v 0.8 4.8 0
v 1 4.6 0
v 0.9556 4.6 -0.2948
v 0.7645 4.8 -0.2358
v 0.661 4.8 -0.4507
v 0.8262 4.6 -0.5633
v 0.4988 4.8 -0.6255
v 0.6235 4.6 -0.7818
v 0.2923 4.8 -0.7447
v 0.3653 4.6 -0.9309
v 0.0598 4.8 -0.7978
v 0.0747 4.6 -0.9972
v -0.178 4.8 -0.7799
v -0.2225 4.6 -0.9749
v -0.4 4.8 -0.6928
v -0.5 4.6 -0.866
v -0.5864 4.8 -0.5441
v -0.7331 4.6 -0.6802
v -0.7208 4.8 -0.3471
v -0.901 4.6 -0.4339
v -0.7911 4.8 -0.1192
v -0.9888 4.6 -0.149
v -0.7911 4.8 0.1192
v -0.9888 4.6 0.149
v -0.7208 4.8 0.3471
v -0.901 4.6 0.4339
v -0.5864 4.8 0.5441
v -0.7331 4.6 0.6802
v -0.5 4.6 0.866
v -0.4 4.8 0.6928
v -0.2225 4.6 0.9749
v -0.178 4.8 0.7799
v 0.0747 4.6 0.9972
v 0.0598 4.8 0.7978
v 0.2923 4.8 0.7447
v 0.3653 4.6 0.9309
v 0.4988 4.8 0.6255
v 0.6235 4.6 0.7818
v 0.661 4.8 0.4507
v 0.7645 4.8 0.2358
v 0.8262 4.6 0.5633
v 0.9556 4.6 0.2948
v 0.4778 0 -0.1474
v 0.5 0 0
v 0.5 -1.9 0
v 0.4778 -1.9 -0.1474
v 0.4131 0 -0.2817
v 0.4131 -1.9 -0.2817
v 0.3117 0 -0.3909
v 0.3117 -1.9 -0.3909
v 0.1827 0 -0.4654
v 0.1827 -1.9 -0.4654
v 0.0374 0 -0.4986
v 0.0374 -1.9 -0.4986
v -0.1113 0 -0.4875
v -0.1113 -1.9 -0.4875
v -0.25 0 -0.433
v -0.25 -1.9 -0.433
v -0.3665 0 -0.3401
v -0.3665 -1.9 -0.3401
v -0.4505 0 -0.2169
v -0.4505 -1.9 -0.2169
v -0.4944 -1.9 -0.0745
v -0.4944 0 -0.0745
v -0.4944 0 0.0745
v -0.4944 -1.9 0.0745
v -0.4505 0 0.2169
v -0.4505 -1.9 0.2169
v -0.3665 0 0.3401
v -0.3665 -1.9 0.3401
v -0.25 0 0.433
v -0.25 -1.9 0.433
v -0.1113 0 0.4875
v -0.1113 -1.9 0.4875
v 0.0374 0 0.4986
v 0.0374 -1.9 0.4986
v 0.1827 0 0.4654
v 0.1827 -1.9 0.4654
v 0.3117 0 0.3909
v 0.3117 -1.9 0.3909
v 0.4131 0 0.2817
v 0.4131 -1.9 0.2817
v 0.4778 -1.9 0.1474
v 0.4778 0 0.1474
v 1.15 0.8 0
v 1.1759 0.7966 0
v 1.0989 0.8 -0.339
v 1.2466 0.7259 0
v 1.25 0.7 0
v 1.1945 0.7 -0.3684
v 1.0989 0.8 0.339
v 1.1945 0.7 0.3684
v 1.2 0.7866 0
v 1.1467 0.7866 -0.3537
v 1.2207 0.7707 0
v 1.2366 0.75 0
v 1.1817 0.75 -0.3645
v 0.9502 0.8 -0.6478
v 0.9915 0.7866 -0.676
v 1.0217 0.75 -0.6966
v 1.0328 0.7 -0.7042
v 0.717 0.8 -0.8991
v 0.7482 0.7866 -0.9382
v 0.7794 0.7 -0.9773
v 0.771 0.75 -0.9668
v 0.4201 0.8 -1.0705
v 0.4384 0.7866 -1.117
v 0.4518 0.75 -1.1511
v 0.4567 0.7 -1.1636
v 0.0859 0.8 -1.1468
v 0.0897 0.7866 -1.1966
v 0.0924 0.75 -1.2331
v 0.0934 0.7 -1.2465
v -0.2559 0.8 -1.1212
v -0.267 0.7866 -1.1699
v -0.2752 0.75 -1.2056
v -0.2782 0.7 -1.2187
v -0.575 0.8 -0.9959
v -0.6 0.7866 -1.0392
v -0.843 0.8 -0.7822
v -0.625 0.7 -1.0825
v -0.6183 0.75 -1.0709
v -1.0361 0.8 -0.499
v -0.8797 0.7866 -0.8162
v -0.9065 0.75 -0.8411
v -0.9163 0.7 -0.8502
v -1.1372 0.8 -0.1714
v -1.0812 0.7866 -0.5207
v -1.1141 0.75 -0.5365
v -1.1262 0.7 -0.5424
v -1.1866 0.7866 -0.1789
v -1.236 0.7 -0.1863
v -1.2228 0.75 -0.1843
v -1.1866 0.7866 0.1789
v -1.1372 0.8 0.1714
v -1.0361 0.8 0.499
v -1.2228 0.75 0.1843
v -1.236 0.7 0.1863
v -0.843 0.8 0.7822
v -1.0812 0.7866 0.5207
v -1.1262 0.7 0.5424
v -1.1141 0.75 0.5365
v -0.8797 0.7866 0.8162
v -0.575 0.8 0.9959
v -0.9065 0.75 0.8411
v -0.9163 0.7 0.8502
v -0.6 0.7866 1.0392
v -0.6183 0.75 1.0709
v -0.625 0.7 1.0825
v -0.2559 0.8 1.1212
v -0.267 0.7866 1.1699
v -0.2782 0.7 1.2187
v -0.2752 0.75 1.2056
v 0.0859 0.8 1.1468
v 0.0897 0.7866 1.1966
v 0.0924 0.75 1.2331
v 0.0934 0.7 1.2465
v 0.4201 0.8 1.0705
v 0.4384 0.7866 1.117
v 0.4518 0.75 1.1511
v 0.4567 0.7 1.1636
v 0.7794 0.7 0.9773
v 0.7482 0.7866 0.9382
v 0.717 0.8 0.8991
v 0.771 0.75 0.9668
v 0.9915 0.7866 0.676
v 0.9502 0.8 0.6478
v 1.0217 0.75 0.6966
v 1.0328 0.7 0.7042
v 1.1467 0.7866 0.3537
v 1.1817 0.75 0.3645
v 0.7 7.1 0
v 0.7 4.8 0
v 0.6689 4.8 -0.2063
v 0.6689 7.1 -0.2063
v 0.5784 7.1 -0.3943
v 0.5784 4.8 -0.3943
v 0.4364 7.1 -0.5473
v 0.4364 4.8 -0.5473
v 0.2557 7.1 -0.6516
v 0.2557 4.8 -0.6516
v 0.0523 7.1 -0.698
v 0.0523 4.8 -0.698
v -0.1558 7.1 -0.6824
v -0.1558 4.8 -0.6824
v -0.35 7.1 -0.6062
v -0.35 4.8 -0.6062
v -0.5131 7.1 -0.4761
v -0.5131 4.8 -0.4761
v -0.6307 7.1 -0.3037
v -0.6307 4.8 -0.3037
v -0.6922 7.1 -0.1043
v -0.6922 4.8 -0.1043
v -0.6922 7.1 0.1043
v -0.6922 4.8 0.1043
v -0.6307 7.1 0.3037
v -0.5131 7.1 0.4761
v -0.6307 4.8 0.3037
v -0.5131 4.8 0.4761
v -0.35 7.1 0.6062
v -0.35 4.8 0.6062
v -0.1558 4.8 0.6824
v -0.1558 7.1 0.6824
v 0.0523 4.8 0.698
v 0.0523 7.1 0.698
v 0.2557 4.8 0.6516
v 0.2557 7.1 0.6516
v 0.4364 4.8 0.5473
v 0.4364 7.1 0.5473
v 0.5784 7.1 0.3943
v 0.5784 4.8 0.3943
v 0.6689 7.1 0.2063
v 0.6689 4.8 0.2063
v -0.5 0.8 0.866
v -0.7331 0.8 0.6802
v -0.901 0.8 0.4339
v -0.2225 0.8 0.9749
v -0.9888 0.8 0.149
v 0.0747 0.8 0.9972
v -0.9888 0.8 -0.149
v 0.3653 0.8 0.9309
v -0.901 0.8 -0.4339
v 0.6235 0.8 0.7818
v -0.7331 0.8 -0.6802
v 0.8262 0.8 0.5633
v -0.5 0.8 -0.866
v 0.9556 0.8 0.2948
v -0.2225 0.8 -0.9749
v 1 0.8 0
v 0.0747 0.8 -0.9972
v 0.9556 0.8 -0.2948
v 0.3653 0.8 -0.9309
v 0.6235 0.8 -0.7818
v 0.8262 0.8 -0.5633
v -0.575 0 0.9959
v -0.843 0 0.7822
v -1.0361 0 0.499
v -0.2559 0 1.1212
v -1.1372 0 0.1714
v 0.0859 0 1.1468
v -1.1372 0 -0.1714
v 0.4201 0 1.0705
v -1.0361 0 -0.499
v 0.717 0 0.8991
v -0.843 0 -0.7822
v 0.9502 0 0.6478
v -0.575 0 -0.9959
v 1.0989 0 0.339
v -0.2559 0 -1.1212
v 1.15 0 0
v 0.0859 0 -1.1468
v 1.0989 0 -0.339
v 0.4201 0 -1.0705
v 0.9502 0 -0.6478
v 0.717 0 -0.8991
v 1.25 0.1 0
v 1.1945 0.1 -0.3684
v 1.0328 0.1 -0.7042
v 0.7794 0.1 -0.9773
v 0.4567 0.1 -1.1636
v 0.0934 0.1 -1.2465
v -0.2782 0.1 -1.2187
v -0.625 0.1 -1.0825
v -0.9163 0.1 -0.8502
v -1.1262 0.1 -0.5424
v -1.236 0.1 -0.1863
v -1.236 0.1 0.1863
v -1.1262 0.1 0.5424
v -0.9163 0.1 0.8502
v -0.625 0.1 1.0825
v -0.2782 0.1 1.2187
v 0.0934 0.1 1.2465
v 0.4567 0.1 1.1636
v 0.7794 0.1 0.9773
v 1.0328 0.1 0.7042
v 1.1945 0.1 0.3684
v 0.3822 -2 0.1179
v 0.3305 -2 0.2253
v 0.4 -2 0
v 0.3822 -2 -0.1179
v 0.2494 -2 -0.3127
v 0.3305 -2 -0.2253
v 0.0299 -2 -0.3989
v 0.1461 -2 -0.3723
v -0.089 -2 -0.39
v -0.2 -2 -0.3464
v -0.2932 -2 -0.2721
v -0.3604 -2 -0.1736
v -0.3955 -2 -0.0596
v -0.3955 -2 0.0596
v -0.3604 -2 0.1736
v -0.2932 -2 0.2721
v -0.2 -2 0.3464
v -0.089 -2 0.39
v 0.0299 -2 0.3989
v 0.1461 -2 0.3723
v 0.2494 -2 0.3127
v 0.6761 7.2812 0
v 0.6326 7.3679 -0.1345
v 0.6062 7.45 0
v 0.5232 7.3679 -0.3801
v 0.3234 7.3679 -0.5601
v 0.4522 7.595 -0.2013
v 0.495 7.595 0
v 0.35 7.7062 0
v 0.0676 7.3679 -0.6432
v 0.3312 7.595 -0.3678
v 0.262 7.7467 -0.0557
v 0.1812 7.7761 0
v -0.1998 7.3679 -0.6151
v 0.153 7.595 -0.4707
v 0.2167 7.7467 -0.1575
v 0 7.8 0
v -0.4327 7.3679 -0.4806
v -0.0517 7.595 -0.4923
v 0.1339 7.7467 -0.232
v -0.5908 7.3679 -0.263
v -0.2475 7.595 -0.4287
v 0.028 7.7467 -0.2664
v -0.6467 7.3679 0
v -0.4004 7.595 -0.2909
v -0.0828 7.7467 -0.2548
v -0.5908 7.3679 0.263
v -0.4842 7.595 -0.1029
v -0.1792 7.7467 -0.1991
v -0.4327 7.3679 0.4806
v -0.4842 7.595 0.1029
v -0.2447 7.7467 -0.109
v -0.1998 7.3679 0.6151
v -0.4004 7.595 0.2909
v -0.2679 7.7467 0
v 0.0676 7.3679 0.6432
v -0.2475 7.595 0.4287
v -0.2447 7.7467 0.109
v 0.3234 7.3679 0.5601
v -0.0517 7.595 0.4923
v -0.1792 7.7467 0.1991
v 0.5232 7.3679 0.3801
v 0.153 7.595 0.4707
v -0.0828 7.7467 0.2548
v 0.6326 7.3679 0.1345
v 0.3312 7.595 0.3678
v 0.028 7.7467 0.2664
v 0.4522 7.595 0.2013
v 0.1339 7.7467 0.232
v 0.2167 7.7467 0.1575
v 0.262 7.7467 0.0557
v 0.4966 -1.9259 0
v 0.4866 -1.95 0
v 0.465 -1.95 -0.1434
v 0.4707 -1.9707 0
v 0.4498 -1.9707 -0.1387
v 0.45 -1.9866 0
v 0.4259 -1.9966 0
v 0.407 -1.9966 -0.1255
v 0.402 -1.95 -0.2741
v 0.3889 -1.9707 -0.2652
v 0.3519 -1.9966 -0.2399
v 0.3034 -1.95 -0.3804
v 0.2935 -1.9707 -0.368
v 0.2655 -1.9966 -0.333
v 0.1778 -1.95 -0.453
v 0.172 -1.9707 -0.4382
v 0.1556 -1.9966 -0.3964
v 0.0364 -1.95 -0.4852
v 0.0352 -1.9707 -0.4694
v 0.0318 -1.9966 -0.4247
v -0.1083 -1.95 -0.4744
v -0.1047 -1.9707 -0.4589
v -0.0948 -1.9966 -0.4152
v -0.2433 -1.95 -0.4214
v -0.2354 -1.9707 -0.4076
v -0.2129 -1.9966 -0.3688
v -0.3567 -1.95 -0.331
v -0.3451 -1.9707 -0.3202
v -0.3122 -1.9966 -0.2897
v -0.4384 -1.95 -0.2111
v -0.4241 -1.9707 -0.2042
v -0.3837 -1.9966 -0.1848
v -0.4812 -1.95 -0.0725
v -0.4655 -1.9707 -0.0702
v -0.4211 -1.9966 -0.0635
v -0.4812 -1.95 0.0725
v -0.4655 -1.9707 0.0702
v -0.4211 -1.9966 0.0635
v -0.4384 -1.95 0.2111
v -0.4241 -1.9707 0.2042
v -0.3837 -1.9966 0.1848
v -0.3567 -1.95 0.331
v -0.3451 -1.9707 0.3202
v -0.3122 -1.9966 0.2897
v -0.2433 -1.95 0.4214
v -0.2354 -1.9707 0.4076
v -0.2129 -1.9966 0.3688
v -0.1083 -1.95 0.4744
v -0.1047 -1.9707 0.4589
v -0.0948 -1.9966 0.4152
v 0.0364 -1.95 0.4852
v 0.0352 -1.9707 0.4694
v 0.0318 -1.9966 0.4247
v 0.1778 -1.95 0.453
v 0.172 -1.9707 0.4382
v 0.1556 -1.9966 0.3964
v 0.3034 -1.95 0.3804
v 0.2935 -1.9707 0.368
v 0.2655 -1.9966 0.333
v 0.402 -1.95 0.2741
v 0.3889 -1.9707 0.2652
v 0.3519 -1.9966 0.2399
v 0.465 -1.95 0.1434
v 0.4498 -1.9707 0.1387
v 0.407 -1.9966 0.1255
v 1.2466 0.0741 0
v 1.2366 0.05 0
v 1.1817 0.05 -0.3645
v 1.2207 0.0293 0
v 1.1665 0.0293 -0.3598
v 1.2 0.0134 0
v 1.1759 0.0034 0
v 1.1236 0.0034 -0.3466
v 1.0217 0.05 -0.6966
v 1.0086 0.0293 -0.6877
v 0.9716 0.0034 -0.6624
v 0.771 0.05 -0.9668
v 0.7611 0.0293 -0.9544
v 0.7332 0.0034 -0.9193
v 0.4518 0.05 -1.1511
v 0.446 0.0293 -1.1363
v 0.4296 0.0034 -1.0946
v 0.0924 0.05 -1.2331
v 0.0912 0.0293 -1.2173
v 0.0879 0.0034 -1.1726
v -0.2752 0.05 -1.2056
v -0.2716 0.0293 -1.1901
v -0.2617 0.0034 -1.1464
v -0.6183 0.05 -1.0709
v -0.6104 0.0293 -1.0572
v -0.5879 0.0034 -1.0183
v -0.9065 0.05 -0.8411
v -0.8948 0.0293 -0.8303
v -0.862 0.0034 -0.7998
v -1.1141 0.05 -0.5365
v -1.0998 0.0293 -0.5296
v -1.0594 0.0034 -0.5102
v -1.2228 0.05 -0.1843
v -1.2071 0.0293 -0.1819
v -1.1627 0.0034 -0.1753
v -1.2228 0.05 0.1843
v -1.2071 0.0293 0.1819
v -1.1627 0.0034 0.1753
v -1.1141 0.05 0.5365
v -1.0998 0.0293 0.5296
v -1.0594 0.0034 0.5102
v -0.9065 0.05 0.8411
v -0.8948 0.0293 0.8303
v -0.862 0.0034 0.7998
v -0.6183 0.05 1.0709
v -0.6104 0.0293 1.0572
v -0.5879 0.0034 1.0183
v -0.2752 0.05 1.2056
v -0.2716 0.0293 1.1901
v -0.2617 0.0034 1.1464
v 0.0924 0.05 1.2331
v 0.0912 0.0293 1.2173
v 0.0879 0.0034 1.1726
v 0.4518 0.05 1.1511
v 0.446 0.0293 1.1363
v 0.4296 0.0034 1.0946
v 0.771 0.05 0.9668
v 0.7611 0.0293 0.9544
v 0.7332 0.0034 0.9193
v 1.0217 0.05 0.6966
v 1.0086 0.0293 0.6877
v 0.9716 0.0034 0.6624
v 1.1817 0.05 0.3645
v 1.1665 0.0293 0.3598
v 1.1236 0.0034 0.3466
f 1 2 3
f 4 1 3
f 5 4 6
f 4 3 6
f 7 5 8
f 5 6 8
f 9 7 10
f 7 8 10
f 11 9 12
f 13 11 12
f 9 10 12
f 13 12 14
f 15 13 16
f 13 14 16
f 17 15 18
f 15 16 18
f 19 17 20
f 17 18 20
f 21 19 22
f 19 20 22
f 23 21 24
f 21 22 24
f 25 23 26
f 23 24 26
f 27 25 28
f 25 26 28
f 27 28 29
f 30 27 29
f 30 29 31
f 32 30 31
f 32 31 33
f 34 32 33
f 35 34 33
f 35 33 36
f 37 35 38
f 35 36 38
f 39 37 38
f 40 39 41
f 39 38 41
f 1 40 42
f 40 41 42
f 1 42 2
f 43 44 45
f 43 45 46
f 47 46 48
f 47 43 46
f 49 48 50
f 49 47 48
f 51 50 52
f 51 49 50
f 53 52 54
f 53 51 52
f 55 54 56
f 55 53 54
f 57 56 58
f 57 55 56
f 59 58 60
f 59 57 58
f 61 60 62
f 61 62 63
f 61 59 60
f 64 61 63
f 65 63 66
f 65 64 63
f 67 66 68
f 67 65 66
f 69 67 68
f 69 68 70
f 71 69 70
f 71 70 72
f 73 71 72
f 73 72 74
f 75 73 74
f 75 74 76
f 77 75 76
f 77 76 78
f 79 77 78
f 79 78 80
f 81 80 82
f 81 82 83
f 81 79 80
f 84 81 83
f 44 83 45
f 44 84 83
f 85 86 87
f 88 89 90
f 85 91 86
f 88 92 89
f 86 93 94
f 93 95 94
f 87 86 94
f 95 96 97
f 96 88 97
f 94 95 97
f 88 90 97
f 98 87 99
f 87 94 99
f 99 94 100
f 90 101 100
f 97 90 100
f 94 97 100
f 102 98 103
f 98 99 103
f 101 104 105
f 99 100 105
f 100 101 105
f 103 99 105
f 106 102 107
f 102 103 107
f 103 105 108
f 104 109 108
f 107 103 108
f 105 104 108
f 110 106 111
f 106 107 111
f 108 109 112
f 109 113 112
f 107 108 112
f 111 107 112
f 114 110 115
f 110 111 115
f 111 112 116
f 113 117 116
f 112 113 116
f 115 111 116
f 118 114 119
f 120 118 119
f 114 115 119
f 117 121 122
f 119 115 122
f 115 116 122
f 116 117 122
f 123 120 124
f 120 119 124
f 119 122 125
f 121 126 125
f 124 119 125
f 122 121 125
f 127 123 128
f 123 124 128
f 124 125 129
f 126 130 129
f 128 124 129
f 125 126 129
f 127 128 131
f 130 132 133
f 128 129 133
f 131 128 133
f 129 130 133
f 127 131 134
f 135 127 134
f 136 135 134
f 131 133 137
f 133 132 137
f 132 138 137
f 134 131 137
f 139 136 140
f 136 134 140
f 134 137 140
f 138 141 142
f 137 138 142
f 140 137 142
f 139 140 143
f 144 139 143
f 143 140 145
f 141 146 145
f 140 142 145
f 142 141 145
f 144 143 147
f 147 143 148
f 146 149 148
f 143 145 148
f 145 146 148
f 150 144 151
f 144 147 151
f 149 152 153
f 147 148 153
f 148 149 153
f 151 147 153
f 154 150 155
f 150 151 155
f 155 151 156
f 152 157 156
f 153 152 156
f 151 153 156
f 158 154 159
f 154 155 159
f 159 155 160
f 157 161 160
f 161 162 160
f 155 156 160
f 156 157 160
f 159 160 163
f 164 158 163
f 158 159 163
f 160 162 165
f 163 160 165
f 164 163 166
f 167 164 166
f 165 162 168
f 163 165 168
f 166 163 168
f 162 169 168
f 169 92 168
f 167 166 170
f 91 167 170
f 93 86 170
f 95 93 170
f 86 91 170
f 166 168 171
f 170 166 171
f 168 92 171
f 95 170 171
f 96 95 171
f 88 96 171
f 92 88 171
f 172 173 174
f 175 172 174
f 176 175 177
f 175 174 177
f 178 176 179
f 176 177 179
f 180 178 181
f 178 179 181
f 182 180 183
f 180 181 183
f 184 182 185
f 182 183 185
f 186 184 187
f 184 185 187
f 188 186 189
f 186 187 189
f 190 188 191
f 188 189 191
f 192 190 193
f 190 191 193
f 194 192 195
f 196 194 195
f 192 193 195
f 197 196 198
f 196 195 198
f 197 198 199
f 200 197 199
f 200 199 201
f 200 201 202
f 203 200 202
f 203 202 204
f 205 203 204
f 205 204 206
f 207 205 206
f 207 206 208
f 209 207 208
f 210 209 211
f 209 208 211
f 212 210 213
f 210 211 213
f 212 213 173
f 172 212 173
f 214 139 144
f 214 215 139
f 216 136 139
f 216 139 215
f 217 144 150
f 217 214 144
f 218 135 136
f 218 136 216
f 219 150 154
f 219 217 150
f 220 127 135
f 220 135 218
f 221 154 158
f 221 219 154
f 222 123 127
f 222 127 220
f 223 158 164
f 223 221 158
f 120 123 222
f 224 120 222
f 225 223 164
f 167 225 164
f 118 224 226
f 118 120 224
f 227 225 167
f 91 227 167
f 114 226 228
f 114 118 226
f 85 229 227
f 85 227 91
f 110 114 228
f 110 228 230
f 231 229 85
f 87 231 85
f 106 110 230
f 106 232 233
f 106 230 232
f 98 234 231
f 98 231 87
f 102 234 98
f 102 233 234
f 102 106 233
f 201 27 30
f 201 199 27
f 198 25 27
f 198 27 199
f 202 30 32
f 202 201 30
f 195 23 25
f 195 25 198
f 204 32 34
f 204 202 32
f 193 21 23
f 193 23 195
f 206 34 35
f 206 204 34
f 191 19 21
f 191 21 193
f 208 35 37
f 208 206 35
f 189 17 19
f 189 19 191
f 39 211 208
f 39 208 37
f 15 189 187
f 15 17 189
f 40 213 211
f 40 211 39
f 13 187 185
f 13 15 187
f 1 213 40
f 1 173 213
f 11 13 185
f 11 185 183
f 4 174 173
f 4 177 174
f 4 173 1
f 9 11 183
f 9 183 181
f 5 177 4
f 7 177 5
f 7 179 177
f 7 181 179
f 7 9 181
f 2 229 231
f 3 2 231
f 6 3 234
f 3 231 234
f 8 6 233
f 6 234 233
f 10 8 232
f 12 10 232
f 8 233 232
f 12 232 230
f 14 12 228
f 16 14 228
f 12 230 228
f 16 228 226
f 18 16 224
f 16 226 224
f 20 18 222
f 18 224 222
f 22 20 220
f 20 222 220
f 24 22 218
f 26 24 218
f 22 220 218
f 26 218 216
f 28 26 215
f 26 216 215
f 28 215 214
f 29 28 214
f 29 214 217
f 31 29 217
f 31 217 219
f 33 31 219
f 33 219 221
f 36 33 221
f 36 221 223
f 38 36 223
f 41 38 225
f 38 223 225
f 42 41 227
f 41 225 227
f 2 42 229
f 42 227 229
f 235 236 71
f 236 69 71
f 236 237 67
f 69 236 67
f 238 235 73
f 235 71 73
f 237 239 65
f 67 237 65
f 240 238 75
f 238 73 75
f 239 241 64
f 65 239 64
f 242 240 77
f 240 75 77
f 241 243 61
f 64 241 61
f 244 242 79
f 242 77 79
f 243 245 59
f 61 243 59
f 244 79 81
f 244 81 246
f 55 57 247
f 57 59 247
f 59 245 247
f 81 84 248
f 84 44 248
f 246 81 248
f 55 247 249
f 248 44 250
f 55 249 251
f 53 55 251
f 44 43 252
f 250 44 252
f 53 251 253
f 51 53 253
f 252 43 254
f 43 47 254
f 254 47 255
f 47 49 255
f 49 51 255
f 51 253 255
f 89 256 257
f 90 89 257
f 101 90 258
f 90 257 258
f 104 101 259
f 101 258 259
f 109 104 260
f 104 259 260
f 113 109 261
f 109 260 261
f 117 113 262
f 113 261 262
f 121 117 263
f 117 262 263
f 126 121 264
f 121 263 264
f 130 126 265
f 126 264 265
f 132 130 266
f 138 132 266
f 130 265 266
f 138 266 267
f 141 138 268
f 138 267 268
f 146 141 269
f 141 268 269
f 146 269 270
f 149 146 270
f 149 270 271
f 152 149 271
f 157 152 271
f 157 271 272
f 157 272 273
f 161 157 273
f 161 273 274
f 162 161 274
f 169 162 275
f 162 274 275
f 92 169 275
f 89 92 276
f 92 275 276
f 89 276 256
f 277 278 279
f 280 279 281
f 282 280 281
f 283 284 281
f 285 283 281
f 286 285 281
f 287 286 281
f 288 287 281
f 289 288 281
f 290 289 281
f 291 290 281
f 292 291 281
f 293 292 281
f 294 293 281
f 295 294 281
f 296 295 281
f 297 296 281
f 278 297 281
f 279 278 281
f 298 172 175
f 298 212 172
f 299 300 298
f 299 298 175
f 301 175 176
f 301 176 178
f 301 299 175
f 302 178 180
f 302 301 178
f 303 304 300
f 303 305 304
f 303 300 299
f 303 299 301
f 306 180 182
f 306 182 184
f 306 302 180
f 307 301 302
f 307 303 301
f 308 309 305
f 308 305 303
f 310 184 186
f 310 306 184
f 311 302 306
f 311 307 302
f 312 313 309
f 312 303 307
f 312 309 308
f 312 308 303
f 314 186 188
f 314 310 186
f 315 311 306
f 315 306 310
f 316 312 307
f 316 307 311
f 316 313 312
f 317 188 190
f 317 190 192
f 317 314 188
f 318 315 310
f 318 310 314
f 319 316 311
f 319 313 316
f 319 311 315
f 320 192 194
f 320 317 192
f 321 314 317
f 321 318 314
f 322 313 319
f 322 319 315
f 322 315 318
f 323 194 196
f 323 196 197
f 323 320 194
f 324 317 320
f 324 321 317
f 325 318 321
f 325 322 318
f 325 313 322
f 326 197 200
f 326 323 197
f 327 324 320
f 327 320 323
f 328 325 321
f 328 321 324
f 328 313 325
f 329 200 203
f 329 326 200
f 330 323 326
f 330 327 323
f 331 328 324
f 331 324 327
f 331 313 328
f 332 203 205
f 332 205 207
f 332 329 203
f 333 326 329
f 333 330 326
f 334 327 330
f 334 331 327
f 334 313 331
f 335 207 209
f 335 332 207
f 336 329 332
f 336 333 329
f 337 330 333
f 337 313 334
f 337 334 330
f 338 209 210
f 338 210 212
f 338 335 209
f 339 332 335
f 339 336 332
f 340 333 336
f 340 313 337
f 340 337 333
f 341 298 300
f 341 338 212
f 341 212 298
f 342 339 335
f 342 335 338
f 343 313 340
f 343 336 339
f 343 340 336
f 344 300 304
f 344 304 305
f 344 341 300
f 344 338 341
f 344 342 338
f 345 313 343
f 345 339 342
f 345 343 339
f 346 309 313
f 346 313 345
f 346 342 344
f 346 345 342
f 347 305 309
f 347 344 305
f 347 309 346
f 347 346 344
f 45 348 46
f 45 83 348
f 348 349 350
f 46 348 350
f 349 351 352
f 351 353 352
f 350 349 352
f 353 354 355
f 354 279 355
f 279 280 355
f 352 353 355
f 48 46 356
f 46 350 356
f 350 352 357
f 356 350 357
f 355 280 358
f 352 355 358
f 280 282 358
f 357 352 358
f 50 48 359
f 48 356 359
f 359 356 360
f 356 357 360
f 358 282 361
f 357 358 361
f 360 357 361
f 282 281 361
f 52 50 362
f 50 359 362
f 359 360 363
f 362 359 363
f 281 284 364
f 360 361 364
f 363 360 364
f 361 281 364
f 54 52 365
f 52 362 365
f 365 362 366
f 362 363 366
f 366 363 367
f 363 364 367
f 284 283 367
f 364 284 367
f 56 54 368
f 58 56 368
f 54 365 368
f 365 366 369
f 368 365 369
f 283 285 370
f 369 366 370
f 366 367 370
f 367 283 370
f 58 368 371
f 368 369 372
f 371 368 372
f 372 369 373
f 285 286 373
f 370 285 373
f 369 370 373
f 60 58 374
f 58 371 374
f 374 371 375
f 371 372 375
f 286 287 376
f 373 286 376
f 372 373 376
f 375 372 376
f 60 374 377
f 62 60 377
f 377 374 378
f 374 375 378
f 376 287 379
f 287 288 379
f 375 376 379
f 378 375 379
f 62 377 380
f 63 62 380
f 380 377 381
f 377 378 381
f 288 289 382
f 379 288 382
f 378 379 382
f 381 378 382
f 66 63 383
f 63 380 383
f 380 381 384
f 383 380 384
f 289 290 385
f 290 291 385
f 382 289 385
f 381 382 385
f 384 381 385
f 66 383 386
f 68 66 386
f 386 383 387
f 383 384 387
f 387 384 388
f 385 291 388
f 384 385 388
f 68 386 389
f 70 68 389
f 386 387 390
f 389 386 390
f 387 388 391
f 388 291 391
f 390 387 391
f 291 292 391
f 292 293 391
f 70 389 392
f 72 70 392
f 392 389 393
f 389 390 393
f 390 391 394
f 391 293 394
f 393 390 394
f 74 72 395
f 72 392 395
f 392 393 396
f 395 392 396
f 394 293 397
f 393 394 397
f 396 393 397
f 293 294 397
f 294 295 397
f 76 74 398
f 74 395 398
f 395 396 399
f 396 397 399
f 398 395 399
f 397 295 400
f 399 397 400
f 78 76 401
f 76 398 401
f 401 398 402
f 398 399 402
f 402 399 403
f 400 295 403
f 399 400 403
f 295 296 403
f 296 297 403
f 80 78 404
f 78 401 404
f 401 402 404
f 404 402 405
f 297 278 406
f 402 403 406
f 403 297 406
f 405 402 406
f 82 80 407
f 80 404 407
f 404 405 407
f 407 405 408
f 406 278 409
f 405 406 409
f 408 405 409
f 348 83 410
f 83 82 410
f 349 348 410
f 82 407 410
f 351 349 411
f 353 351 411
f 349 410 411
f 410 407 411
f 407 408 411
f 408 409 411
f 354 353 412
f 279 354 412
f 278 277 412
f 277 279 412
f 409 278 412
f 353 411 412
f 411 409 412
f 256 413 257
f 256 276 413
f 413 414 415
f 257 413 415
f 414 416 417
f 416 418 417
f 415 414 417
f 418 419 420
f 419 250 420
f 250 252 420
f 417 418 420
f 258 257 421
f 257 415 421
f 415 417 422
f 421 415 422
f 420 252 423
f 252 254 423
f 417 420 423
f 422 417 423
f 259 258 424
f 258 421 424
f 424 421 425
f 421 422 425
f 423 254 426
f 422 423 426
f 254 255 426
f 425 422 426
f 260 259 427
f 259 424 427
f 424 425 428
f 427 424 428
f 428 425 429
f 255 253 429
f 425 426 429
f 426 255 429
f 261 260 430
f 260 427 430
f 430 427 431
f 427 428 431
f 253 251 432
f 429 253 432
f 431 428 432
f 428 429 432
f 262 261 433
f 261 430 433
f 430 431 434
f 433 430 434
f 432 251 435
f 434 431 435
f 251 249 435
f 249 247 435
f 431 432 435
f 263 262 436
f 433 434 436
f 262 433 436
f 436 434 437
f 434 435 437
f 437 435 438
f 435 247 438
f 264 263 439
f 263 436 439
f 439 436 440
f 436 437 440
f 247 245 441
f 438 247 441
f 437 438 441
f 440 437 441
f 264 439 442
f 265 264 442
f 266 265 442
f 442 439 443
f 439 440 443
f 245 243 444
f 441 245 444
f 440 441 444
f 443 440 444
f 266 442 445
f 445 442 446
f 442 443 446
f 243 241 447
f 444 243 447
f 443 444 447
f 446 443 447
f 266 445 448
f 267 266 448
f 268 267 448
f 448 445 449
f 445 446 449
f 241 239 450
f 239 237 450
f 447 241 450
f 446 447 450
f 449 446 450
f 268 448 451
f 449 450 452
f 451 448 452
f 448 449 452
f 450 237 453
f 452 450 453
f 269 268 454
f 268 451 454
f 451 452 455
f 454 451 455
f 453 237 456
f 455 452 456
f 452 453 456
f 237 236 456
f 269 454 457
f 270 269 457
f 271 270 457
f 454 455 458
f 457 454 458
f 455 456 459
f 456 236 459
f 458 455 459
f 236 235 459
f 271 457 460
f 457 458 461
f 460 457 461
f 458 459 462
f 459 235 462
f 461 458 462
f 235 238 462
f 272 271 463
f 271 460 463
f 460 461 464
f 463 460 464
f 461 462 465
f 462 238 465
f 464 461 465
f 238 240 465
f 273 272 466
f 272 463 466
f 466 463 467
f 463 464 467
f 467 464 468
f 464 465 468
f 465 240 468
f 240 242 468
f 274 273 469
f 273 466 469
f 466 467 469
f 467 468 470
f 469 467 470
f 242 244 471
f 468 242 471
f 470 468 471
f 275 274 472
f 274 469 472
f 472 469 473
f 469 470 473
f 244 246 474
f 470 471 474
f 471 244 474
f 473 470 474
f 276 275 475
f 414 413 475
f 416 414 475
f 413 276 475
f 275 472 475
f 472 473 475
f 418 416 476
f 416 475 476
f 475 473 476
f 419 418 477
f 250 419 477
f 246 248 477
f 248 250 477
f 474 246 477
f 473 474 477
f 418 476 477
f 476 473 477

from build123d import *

# Parameters (mm, degrees)
SKETCH_1_R      = 0.5
EXTRUDE_1_DEPTH = 2
SKETCH_2_R      = 1.25
EXTRUDE_2_DEPTH = 0.8
SKETCH_3_R      = 1
EXTRUDE_3_DEPTH = 4
SKETCH_4_R      = 0.7
EXTRUDE_4_DEPTH = 3
FILLET_1_R      = 0.7
CHAMFER_1_SIZE  = 0.2
FILLET_2_R      = 0.1


with BuildPart() as part:
    # 草图1 → 凸台-拉伸1 (new body)
    with BuildSketch(Plane(origin=(0, 0, 0), x_dir=(1, 0, 0), z_dir=(0, 1, 0))):
        Circle(SKETCH_1_R)
    extrude(amount=-EXTRUDE_1_DEPTH)

    # 草图2 → 凸台-拉伸2 (add)
    with BuildSketch(Plane(origin=(0, 0, 0), x_dir=(1, 0, 0), z_dir=(0, 1, 0))):
        Circle(SKETCH_2_R)
    extrude(amount=EXTRUDE_2_DEPTH)

    # 草图3 → 凸台-拉伸3 (add)
    with BuildSketch(Plane(origin=(0, 0.8, 0), x_dir=(1, 0, 0), z_dir=(0, 1, 0))):
        Circle(SKETCH_3_R)
    extrude(amount=EXTRUDE_3_DEPTH)

    # 草图4 → 凸台-拉伸4 (add)
    with BuildSketch(Plane(origin=(0, 4.8, 0), x_dir=(1, 0, 0), z_dir=(0, 1, 0))):
        Circle(SKETCH_4_R)
    extrude(amount=EXTRUDE_4_DEPTH)

    # 圆角1
    fillet_1_edges = [part.edges().sort_by_distance(p)[0] for p in [
        (-0.7, 7.8, 0),
    ]]
    fillet(fillet_1_edges, radius=FILLET_1_R)

    # 倒角1
    chamfer_1_edges = [part.edges().sort_by_distance(p)[0] for p in [
        (-1, 4.8, 0),
    ]]
    chamfer(chamfer_1_edges, length=CHAMFER_1_SIZE)

    # 圆角2
    fillet_2_edges = [part.edges().sort_by_distance(p)[0] for p in [
        (-0.5, -2, 0),
        (-1.25, 0, 0),
        (-1.25, 0.8, 0),
    ]]
    fillet(fillet_2_edges, radius=FILLET_2_R)


solid = part.part
